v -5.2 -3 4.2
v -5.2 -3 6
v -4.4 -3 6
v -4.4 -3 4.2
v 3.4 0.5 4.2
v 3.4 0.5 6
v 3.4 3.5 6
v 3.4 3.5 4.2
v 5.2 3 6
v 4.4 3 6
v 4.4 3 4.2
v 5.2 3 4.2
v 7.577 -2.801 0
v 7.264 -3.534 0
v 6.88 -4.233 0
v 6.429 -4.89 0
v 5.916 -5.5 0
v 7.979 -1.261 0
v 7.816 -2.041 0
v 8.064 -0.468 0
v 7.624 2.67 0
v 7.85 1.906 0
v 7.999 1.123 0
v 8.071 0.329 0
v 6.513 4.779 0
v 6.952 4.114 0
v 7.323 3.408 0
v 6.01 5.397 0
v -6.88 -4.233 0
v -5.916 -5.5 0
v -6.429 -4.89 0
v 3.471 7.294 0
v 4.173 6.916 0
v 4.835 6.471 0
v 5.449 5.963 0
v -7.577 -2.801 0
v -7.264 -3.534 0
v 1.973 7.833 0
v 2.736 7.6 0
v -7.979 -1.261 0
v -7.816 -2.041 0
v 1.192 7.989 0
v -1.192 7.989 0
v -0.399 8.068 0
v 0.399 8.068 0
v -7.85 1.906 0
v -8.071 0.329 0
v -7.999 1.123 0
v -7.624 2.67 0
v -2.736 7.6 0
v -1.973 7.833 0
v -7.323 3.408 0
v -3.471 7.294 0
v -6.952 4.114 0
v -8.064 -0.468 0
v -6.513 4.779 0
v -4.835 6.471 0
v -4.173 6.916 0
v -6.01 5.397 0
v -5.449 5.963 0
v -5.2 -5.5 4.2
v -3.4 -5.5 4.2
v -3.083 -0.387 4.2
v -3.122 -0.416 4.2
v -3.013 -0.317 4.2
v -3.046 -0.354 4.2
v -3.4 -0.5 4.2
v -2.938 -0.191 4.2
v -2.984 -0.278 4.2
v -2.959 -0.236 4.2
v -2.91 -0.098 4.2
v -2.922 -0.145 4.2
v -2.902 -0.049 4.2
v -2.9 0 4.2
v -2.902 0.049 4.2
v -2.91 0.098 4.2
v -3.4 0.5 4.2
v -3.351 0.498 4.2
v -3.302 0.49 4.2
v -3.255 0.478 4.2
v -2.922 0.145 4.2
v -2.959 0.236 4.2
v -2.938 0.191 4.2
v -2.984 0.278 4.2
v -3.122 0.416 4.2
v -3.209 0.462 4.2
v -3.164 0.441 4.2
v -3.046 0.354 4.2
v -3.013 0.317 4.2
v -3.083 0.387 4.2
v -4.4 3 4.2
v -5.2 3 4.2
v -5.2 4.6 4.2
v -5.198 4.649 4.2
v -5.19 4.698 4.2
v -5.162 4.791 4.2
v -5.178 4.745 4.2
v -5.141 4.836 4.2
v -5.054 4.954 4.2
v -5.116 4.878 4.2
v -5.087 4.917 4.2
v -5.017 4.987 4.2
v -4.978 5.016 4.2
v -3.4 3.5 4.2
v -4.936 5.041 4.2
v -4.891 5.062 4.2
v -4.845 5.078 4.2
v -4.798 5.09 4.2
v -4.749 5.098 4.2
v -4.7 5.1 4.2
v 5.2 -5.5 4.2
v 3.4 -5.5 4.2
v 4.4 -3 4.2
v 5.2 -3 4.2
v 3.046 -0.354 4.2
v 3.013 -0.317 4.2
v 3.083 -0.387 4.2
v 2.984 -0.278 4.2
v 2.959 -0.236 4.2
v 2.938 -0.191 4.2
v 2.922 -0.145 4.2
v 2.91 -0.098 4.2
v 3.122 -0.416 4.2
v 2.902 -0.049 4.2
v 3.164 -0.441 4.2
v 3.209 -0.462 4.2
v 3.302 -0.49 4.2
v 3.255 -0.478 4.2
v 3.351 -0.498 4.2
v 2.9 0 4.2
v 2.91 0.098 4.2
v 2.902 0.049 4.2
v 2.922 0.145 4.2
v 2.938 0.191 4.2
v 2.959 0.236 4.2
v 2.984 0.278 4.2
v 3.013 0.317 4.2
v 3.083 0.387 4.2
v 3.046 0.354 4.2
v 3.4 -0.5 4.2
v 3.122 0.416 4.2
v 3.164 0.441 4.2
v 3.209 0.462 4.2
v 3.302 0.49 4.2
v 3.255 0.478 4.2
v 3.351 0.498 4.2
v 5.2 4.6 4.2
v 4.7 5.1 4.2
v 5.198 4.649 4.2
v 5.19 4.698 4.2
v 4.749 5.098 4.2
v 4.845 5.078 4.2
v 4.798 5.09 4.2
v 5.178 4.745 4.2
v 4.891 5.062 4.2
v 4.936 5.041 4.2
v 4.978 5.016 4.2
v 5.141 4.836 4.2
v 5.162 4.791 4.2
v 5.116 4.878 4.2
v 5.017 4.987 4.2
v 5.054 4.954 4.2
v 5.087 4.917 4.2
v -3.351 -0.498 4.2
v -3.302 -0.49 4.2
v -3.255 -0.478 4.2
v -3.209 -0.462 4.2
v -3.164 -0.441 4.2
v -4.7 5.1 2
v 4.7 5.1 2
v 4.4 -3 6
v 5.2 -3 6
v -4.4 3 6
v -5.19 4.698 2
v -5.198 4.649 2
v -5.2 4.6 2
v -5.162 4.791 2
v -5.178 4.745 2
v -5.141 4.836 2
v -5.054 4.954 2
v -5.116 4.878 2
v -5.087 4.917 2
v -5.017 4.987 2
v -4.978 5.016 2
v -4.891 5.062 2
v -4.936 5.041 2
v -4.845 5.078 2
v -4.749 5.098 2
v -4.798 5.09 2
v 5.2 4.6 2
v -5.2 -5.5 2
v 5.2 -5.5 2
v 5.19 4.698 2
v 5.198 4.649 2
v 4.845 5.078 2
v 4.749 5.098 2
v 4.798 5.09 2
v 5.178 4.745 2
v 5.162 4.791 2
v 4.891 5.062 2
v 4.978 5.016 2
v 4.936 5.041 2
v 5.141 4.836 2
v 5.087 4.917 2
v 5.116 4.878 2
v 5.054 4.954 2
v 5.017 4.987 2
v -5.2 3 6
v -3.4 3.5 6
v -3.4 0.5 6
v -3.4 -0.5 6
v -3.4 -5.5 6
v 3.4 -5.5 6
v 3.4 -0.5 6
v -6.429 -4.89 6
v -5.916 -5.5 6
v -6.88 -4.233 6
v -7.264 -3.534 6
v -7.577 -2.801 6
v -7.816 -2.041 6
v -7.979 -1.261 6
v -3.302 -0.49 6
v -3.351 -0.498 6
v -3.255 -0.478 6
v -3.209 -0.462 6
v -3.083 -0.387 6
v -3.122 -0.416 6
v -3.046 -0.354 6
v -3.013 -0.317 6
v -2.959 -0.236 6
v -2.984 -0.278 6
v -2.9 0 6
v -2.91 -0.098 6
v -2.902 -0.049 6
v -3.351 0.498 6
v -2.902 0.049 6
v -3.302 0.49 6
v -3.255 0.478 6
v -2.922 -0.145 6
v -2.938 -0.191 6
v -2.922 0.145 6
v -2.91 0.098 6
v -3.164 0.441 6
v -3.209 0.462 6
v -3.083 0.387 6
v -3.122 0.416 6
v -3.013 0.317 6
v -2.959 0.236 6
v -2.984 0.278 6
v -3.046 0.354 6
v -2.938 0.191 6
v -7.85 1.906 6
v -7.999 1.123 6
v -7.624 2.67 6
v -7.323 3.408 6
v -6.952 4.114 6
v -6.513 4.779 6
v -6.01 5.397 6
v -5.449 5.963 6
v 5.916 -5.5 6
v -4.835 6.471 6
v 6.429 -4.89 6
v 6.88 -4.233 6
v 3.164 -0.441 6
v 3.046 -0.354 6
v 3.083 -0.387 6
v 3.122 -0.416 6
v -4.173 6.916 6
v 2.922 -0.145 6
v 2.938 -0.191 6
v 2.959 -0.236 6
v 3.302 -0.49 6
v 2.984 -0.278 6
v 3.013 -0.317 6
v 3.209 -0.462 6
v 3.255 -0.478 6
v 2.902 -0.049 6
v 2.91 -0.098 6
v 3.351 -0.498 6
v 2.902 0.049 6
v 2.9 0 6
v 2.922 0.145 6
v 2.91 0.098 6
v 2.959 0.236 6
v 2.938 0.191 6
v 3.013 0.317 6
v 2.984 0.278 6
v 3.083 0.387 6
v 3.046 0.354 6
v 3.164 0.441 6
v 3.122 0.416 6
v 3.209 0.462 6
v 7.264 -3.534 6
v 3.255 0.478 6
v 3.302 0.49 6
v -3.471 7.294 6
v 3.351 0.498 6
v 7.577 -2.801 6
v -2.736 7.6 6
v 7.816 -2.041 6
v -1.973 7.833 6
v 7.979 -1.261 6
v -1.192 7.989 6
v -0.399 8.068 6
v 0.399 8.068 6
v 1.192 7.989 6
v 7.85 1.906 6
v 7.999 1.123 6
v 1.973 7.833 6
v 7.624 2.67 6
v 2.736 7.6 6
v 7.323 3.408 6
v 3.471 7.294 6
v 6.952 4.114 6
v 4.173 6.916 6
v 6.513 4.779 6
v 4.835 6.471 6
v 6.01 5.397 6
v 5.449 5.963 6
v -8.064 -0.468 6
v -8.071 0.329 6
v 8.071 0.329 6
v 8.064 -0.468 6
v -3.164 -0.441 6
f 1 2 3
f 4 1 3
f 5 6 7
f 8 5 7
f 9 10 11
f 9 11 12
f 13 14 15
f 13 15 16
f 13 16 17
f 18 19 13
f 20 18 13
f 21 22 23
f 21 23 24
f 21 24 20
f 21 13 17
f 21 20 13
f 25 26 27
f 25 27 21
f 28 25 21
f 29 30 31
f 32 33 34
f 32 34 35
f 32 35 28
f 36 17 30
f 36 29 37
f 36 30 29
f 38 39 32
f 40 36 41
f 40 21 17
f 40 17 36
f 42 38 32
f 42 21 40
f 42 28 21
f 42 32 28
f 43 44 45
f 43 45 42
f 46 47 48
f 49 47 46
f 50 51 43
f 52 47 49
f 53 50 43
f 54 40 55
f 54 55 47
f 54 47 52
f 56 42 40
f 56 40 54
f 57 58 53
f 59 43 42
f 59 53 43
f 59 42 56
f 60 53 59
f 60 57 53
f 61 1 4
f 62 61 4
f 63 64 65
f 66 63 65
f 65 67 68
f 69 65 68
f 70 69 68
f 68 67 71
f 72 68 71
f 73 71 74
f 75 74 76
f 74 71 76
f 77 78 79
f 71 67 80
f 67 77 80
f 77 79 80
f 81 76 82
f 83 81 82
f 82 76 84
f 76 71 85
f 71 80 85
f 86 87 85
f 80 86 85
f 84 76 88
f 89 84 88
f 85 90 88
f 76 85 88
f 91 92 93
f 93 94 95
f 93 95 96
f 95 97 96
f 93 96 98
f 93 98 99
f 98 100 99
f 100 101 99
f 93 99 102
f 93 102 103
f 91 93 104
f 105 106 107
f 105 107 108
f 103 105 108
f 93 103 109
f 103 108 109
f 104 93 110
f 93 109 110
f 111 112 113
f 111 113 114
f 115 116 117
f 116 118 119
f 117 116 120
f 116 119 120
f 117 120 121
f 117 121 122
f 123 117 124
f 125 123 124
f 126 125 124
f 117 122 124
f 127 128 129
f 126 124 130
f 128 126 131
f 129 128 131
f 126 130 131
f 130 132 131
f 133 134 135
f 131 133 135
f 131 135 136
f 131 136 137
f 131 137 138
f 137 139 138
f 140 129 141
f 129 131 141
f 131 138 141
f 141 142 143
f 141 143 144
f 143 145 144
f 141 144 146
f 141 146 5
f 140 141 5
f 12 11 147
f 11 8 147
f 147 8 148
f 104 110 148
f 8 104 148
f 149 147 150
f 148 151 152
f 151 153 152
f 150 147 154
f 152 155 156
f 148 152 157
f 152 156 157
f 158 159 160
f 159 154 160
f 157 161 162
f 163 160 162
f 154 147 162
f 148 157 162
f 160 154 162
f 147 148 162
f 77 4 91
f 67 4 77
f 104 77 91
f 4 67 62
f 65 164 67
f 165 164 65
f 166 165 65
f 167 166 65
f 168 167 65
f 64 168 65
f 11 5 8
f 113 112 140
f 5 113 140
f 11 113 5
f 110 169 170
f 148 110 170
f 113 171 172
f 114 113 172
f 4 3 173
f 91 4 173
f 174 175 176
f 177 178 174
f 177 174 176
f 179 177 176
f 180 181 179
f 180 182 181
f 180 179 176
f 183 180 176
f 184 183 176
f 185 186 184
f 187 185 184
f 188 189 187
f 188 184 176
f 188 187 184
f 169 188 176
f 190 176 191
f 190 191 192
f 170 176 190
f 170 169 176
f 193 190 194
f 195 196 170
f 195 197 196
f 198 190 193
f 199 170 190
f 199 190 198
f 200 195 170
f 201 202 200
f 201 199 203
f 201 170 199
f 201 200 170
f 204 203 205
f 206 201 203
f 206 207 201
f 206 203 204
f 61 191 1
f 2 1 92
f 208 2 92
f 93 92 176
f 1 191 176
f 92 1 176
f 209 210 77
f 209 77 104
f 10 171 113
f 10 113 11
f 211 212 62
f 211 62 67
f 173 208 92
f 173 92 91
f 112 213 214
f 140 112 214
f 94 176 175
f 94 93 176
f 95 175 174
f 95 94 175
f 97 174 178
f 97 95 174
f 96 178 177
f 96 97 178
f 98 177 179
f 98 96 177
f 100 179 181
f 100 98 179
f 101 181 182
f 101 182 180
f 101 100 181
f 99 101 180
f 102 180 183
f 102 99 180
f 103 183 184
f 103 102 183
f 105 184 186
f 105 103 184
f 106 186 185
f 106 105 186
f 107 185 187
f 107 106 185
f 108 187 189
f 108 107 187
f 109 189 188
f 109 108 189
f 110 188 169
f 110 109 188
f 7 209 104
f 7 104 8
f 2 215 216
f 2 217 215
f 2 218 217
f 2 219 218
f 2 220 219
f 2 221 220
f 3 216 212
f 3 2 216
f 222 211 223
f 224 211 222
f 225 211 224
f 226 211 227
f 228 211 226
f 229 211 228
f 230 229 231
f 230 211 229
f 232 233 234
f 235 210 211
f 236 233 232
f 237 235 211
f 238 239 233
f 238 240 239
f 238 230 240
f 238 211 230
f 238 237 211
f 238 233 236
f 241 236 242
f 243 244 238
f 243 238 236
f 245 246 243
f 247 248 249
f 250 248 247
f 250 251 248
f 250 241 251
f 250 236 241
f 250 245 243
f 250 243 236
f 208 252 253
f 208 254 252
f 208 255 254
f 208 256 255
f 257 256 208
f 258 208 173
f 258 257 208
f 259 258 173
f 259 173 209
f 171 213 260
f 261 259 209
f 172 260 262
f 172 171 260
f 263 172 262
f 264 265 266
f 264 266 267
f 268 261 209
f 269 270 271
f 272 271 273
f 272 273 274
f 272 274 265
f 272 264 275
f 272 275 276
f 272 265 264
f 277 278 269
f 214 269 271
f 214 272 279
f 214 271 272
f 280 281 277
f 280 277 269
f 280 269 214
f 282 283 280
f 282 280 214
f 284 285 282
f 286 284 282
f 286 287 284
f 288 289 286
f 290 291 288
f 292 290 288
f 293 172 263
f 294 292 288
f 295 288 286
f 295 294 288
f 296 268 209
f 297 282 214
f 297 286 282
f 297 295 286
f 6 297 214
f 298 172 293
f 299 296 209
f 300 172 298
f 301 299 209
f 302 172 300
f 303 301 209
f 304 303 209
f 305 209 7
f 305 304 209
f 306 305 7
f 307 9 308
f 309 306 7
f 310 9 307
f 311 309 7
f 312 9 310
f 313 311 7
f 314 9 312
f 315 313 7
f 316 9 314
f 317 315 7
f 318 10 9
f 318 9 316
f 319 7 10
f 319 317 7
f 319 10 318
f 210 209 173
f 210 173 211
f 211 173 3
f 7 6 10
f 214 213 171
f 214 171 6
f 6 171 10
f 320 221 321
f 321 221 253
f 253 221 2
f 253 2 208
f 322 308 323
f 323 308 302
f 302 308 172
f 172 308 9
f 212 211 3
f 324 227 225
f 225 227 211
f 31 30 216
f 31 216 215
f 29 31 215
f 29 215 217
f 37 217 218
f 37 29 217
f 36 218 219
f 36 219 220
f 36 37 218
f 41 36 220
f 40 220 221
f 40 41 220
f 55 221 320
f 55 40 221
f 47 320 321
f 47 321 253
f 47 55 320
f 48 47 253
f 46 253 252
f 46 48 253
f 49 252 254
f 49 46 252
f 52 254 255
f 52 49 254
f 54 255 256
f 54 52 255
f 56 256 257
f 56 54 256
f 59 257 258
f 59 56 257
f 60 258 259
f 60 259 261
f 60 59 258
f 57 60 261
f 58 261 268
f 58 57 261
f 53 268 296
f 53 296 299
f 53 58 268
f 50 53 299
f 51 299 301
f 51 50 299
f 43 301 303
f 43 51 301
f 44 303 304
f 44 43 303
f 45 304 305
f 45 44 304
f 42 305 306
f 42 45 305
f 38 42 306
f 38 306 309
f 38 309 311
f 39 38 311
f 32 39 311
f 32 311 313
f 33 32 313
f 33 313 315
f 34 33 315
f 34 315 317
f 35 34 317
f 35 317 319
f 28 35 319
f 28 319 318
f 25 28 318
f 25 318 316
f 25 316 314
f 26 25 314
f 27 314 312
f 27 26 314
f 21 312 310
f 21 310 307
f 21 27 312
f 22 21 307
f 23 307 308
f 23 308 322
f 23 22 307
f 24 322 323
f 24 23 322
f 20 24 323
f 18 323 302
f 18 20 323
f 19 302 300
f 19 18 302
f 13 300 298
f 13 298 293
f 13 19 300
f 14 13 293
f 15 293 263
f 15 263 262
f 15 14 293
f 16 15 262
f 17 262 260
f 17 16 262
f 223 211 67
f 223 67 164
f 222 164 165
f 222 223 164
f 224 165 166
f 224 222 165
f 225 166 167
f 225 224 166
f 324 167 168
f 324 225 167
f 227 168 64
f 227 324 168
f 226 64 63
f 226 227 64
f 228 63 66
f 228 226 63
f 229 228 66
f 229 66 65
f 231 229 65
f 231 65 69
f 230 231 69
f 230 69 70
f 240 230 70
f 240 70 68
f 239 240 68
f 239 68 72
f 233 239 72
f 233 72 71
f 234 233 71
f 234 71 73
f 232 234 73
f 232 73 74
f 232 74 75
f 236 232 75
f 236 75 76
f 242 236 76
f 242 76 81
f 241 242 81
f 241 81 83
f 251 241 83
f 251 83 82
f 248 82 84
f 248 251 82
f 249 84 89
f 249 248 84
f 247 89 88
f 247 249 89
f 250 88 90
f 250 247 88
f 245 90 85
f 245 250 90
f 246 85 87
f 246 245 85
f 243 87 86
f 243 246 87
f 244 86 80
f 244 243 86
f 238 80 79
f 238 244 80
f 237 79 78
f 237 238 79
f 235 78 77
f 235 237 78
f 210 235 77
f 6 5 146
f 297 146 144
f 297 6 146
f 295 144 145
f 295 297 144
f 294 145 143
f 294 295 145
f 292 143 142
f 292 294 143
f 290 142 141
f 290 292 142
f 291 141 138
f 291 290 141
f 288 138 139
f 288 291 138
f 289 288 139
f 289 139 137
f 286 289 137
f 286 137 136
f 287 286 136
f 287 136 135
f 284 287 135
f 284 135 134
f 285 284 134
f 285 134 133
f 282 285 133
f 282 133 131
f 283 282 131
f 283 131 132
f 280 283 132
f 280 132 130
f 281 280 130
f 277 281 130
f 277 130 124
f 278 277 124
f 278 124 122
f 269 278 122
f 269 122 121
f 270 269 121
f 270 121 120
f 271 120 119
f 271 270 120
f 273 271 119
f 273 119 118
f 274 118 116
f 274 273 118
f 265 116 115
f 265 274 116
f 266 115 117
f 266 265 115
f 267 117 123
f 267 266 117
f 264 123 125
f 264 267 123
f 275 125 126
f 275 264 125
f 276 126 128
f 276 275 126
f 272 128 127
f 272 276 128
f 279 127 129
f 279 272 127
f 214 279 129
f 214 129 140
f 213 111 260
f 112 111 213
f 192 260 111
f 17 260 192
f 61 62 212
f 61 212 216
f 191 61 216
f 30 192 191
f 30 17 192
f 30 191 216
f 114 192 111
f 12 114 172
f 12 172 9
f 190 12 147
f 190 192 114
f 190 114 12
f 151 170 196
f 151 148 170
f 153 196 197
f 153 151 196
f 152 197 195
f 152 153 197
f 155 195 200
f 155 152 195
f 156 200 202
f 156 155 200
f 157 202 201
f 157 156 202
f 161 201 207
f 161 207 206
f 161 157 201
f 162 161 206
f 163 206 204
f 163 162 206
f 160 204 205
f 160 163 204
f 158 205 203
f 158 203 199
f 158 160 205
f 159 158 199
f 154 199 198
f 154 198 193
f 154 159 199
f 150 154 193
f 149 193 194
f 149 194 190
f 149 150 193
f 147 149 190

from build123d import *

# Parameters (mm, degrees)
BOSS_EXTRUDE1_DEPTH = 6
SKETCH2_W           = 6.8
SKETCH2_H           = 9
CUT_EXTRUDE1_DEPTH  = 4
SKETCH3_W           = 10.4
SKETCH3_H           = 10.6
CUT_EXTRUDE2_DEPTH  = 2.2
SKETCH4_W           = 0.8
SKETCH4_H           = 6
CUT_EXTRUDE3_DEPTH  = 2.2
SKETCH5_R           = 0.5
BOSS_EXTRUDE2_DEPTH = 1.8
FILLET1_R           = 0.5


with BuildPart() as part:
    # Sketch1 → Boss-Extrude1 (new body)
    with BuildSketch(Plane.XY):
        with BuildLine():
            Line((5.916079783, -5.5), (-5.916079783, -5.5))
            ThreePointArc((-5.916079783, -5.5), (0, 8.077747211), (5.916079783, -5.5))
        make_face()
    extrude(amount=BOSS_EXTRUDE1_DEPTH)

    # Sketch2 → Cut-Extrude1 (cut)
    with BuildSketch(Plane.XY.offset(6)):
        with Locations((0, -1)):
            Rectangle(SKETCH2_W, SKETCH2_H)
    extrude(amount=-CUT_EXTRUDE1_DEPTH, mode=Mode.SUBTRACT)

    # Sketch3 → Cut-Extrude2 (cut)
    with BuildSketch(Plane.XY.offset(2)):
        with Locations((0, -0.2)):
            Rectangle(SKETCH3_W, SKETCH3_H)
    extrude(amount=CUT_EXTRUDE2_DEPTH, mode=Mode.SUBTRACT)

    # Sketch4 → Cut-Extrude3 (cut)
    with BuildSketch(Plane.XY.offset(6)):
        with Locations((-4.8, 0)):
            Rectangle(SKETCH4_W, SKETCH4_H)
        with Locations((4.8, 0)):
            Rectangle(SKETCH4_W, SKETCH4_H)
    extrude(amount=-CUT_EXTRUDE3_DEPTH, mode=Mode.SUBTRACT)

    # Sketch5 → Boss-Extrude2 (add)
    with BuildSketch(Plane.XY.offset(6)):
        with Locations((-3.4, 0)):
            Circle(SKETCH5_R)
        with Locations((3.4, 0)):
            Circle(SKETCH5_R)
    extrude(amount=-BOSS_EXTRUDE2_DEPTH)

    # Fillet1
    fillet1_edges = [part.edges().sort_by_distance(p)[0] for p in [
        (-5.2, 5.1, 3.1),
        (5.2, 5.1, 3.1),
    ]]
    fillet(fillet1_edges, radius=FILLET1_R)


solid = part.part
